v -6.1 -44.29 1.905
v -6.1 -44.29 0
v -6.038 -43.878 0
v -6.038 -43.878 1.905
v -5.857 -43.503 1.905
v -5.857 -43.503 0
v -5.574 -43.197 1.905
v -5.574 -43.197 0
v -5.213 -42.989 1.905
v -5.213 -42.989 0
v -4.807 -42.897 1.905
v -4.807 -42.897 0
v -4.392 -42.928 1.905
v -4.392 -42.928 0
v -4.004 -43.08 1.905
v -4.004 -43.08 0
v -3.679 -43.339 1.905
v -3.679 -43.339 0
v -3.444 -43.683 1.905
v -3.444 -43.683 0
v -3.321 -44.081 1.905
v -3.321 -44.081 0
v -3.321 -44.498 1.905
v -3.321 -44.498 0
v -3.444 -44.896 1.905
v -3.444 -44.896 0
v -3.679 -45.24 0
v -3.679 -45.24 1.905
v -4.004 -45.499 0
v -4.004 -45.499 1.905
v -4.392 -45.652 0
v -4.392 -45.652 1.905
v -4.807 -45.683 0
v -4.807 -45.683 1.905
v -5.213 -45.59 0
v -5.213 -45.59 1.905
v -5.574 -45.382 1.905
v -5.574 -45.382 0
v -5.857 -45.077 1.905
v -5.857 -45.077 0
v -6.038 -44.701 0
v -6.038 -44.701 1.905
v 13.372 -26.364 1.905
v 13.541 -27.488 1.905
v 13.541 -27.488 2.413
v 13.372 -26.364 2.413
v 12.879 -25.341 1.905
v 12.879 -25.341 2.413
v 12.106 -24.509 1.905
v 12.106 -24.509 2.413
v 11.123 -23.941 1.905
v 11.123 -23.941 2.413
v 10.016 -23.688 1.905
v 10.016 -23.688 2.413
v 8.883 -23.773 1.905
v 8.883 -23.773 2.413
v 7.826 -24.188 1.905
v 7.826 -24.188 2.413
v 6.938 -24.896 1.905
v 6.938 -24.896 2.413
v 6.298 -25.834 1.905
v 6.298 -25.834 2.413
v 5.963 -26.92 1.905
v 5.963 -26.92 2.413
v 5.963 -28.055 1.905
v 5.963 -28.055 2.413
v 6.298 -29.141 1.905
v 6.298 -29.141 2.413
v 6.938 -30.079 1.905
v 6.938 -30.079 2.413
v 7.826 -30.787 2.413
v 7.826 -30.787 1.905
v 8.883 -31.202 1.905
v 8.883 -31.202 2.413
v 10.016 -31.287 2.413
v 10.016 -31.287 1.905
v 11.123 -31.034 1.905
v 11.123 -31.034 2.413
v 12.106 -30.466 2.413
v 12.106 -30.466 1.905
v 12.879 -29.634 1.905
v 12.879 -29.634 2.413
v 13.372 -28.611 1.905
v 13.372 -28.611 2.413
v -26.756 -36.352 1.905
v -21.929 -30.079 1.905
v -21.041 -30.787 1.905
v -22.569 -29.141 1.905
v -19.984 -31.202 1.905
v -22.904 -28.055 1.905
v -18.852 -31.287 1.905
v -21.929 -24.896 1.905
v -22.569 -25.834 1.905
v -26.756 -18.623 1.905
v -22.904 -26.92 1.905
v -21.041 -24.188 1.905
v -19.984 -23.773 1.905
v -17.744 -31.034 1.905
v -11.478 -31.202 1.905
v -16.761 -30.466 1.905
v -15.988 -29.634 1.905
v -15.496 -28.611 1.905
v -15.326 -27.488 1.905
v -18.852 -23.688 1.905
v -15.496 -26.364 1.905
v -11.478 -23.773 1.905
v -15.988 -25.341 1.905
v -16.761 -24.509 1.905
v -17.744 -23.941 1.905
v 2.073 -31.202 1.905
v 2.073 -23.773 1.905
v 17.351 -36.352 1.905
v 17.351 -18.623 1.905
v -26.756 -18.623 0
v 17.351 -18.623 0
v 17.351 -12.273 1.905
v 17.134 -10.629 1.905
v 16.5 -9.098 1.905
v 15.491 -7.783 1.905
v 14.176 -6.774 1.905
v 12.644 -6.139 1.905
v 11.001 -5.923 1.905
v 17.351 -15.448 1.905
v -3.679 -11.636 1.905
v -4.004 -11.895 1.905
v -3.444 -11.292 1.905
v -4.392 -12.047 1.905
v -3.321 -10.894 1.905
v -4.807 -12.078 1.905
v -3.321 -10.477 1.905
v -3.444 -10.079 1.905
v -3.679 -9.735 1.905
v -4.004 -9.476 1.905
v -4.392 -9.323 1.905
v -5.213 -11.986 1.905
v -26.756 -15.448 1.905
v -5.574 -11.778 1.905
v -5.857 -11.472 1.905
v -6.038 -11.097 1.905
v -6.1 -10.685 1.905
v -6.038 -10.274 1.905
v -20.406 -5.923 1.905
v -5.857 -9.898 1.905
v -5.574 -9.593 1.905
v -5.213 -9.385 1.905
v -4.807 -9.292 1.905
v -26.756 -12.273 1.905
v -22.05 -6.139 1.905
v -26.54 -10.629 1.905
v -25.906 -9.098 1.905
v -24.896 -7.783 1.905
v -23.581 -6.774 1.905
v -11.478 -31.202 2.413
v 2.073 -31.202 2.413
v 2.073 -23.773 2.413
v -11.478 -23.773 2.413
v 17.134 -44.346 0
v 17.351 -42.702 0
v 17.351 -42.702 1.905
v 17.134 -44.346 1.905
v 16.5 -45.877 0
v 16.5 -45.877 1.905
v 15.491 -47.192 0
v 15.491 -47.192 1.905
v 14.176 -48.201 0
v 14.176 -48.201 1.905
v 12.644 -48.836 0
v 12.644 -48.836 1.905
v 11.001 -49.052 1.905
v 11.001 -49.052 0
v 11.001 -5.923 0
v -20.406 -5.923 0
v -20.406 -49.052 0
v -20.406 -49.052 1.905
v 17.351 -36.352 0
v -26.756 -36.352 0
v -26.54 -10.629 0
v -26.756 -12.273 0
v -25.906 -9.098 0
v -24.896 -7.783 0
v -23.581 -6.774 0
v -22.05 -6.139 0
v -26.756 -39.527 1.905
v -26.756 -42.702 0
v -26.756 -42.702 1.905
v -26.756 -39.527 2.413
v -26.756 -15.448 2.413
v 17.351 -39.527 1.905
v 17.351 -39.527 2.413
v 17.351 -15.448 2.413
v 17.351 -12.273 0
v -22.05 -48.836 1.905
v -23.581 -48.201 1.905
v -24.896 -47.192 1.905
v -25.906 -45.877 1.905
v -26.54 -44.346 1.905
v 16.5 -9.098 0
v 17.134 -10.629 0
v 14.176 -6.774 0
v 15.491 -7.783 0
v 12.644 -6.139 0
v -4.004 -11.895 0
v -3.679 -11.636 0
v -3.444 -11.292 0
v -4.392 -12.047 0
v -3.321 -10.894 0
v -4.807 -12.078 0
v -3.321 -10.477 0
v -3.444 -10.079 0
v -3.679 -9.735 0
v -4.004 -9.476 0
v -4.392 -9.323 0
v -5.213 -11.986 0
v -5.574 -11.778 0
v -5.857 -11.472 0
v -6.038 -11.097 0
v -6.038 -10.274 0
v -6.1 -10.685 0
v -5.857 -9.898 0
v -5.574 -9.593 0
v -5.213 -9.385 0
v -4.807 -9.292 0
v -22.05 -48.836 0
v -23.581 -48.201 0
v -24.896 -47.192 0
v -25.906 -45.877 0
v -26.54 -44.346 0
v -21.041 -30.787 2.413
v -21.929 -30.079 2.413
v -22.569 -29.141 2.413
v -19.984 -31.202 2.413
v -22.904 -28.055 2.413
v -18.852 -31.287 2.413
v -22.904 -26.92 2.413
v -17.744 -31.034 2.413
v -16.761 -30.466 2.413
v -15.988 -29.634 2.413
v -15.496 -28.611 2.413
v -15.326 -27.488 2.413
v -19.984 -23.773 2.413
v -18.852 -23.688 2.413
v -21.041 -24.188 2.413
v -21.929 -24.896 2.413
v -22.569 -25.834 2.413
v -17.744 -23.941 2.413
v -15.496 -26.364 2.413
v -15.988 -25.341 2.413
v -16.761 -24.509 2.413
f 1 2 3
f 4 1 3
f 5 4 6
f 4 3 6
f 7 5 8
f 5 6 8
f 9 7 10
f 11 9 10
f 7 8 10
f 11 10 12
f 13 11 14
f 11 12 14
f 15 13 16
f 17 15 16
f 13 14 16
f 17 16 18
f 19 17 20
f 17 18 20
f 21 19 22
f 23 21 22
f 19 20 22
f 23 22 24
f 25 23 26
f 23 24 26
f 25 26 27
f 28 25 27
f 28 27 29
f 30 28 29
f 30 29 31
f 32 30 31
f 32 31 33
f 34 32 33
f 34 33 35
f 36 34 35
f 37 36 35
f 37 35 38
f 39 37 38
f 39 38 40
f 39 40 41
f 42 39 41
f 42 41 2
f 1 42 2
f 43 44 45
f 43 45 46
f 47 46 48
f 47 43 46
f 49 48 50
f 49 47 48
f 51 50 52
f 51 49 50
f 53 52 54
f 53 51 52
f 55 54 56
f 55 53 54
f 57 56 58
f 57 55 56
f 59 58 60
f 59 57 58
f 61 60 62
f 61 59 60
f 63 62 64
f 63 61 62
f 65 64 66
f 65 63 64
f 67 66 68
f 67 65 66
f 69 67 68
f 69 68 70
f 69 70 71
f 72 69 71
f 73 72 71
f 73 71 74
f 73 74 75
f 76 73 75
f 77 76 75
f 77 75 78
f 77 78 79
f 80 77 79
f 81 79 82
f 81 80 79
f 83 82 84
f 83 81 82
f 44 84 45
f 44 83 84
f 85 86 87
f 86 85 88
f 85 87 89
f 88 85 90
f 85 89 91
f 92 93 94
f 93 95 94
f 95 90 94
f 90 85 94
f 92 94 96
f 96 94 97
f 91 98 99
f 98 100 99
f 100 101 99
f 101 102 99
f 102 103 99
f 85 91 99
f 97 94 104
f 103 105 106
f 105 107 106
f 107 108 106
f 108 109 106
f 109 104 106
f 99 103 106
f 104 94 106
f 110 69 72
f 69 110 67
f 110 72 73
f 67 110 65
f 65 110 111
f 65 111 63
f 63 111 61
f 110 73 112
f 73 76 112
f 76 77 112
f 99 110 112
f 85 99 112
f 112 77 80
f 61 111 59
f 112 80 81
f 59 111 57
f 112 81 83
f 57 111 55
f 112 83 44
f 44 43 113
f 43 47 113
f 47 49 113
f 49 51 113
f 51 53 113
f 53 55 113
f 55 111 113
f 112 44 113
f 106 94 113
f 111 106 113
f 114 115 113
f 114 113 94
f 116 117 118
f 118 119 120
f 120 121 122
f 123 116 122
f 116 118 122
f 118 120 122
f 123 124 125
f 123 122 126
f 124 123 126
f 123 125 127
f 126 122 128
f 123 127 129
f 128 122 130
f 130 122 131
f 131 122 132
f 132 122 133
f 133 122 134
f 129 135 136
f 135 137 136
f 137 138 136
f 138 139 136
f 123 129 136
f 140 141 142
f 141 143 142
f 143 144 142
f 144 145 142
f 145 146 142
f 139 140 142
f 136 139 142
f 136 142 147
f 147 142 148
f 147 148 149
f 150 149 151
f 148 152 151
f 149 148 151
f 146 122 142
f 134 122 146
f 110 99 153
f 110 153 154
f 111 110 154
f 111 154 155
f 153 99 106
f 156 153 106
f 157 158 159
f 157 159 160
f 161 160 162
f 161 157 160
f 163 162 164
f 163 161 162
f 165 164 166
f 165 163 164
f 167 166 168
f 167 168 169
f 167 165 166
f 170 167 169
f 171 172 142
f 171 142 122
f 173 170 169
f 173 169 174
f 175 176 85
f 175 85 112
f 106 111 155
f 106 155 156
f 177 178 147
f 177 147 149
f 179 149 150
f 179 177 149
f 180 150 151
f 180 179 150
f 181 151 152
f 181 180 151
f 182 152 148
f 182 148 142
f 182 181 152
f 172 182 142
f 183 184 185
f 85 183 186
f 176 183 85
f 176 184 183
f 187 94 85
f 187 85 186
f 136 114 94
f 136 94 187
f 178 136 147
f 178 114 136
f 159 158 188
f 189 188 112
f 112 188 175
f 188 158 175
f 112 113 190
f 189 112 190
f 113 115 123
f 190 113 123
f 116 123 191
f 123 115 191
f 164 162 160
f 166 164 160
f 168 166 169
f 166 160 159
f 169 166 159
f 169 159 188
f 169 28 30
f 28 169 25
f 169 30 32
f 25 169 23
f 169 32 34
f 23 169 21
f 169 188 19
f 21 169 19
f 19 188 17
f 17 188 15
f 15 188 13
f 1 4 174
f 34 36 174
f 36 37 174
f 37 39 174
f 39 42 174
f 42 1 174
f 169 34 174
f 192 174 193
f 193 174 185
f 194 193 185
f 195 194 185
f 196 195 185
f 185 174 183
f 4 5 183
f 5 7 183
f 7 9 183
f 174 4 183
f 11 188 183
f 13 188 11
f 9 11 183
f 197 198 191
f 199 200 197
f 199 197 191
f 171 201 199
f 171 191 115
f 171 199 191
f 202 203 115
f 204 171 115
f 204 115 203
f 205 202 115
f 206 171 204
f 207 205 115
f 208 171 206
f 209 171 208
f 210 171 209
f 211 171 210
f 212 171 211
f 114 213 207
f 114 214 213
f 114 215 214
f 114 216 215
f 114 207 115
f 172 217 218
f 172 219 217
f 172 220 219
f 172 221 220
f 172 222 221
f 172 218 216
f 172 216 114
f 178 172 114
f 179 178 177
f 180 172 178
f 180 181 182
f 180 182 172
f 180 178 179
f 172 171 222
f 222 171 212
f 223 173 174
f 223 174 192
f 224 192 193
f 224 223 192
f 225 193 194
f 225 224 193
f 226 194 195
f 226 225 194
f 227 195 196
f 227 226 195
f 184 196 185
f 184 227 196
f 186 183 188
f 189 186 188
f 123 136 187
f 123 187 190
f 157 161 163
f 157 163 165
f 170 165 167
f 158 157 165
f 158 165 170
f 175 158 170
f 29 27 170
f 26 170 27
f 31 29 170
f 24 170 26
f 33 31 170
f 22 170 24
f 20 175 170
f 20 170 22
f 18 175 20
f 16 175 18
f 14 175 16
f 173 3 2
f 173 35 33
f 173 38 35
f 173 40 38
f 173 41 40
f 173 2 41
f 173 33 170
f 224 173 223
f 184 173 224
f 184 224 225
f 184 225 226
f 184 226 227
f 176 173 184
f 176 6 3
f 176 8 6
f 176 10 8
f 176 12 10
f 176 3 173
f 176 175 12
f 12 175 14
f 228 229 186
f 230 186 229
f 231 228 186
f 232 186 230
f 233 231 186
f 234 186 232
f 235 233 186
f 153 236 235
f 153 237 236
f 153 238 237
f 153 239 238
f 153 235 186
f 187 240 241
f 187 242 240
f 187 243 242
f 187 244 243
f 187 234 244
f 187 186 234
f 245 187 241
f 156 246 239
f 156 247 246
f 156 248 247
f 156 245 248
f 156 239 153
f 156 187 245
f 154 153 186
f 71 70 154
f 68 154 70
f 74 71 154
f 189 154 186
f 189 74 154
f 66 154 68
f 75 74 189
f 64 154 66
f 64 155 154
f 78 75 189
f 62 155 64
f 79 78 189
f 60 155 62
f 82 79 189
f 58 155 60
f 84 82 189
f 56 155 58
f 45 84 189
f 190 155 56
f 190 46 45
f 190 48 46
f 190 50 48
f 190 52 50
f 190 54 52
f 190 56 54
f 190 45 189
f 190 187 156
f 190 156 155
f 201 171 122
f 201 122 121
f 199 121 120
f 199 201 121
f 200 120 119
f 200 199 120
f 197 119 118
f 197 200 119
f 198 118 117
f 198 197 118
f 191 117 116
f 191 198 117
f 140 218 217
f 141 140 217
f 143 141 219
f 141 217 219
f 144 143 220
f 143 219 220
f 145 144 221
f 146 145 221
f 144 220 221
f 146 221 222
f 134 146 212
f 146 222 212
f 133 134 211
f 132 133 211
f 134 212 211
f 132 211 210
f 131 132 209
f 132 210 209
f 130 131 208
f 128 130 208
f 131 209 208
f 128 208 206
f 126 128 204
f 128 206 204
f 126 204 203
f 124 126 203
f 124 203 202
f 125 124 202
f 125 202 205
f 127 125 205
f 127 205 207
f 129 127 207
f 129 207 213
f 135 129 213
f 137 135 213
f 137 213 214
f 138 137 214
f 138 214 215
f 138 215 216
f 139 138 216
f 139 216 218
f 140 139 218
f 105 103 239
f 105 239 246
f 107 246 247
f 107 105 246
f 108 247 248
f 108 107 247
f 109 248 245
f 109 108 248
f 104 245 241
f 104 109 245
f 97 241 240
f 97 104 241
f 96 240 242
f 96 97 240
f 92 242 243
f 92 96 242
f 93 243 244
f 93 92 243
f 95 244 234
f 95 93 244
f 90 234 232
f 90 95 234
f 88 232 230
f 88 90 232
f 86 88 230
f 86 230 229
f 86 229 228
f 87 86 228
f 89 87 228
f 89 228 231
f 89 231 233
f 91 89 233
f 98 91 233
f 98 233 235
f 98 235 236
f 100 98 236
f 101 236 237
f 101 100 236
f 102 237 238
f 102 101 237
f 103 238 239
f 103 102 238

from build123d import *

# Parameters (mm, degrees)
BOSS_EXTRUDE1_DEPTH   = 1.905
BOSS_EXTRUDE1_2_DEPTH = 1.905
SKETCH2_W             = 44.1071
SKETCH2_H             = 24.0792
SKETCH2_R             = 3.81
BOSS_EXTRUDE2_DEPTH   = 0.508
F_3_CLEARANCE_HOLE1_D = 2.794


with BuildPart() as part:
    # Sketch1 → Boss-Extrude1 (new body)
    with BuildSketch(Plane.XY):
        with BuildLine():
            Line((-26.756249968, -18.6229), (-26.756249968, -12.2729))
            ThreePointArc((-26.756249968, -12.2729), (-24.896378028, -7.782771939), (-20.406249968, -5.9229))
            Line((-20.406249968, -5.9229), (11.000850032, -5.9229))
            ThreePointArc((11.000850032, -5.9229), (15.490978093, -7.782771939), (17.350850032, -12.2729))
            Line((17.350850032, -12.2729), (17.350850032, -18.6229))
            Line((17.350850032, -18.6229), (-26.756249968, -18.6229))
        make_face()
    extrude(amount=BOSS_EXTRUDE1_DEPTH)



with BuildPart() as body_2:
    # Sketch1 → Boss-Extrude1 2 (new body)
    with BuildSketch(Plane.XY):
        with BuildLine():
            Line((-26.756249968, -36.3521), (17.350850032, -36.3521))
            Line((17.350850032, -36.3521), (17.350850032, -42.7021))
            ThreePointArc((17.350850032, -42.7021), (15.490978093, -47.192228061), (11.000850032, -49.0521))
            Line((11.000850032, -49.0521), (-20.406249968, -49.0521))
            ThreePointArc((-20.406249968, -49.0521), (-24.896378028, -47.192228061), (-26.756249968, -42.7021))
            Line((-26.756249968, -42.7021), (-26.756249968, -36.3521))
        make_face()
    extrude(amount=BOSS_EXTRUDE1_2_DEPTH)


with BuildPart() as part_1:
    add(part.part)

    add(body_2.part)  # Boss-Extrude2 merges body 2
    # Sketch2 → Boss-Extrude2 (add)
    with BuildSketch(Plane.XY.offset(1.905)):
        with Locations((-4.702699968, -27.4875)):
            Rectangle(SKETCH2_W, SKETCH2_H)
        with Locations((9.730850032, -27.4875)):
            Circle(SKETCH2_R, mode=Mode.SUBTRACT)
        with Locations((-19.136249968, -27.4875)):
            Circle(SKETCH2_R, mode=Mode.SUBTRACT)
        Polygon((-11.478149968, -23.77275), (-11.478149968, -24.71255), (-11.478149968, -30.26245), (-11.478149968, -31.20225), (2.072750032, -31.20225), (2.072750032, -23.77275), align=None, mode=Mode.SUBTRACT)
    extrude(amount=BOSS_EXTRUDE2_DEPTH)

    # #3 Clearance Hole1 (through all)
    with Locations(Plane.XY.offset(1.905)):
        with Locations((-4.702699968, -10.6854), (-4.702699968, -44.2896)):
            Hole(F_3_CLEARANCE_HOLE1_D / 2)


solid = part_1.part
